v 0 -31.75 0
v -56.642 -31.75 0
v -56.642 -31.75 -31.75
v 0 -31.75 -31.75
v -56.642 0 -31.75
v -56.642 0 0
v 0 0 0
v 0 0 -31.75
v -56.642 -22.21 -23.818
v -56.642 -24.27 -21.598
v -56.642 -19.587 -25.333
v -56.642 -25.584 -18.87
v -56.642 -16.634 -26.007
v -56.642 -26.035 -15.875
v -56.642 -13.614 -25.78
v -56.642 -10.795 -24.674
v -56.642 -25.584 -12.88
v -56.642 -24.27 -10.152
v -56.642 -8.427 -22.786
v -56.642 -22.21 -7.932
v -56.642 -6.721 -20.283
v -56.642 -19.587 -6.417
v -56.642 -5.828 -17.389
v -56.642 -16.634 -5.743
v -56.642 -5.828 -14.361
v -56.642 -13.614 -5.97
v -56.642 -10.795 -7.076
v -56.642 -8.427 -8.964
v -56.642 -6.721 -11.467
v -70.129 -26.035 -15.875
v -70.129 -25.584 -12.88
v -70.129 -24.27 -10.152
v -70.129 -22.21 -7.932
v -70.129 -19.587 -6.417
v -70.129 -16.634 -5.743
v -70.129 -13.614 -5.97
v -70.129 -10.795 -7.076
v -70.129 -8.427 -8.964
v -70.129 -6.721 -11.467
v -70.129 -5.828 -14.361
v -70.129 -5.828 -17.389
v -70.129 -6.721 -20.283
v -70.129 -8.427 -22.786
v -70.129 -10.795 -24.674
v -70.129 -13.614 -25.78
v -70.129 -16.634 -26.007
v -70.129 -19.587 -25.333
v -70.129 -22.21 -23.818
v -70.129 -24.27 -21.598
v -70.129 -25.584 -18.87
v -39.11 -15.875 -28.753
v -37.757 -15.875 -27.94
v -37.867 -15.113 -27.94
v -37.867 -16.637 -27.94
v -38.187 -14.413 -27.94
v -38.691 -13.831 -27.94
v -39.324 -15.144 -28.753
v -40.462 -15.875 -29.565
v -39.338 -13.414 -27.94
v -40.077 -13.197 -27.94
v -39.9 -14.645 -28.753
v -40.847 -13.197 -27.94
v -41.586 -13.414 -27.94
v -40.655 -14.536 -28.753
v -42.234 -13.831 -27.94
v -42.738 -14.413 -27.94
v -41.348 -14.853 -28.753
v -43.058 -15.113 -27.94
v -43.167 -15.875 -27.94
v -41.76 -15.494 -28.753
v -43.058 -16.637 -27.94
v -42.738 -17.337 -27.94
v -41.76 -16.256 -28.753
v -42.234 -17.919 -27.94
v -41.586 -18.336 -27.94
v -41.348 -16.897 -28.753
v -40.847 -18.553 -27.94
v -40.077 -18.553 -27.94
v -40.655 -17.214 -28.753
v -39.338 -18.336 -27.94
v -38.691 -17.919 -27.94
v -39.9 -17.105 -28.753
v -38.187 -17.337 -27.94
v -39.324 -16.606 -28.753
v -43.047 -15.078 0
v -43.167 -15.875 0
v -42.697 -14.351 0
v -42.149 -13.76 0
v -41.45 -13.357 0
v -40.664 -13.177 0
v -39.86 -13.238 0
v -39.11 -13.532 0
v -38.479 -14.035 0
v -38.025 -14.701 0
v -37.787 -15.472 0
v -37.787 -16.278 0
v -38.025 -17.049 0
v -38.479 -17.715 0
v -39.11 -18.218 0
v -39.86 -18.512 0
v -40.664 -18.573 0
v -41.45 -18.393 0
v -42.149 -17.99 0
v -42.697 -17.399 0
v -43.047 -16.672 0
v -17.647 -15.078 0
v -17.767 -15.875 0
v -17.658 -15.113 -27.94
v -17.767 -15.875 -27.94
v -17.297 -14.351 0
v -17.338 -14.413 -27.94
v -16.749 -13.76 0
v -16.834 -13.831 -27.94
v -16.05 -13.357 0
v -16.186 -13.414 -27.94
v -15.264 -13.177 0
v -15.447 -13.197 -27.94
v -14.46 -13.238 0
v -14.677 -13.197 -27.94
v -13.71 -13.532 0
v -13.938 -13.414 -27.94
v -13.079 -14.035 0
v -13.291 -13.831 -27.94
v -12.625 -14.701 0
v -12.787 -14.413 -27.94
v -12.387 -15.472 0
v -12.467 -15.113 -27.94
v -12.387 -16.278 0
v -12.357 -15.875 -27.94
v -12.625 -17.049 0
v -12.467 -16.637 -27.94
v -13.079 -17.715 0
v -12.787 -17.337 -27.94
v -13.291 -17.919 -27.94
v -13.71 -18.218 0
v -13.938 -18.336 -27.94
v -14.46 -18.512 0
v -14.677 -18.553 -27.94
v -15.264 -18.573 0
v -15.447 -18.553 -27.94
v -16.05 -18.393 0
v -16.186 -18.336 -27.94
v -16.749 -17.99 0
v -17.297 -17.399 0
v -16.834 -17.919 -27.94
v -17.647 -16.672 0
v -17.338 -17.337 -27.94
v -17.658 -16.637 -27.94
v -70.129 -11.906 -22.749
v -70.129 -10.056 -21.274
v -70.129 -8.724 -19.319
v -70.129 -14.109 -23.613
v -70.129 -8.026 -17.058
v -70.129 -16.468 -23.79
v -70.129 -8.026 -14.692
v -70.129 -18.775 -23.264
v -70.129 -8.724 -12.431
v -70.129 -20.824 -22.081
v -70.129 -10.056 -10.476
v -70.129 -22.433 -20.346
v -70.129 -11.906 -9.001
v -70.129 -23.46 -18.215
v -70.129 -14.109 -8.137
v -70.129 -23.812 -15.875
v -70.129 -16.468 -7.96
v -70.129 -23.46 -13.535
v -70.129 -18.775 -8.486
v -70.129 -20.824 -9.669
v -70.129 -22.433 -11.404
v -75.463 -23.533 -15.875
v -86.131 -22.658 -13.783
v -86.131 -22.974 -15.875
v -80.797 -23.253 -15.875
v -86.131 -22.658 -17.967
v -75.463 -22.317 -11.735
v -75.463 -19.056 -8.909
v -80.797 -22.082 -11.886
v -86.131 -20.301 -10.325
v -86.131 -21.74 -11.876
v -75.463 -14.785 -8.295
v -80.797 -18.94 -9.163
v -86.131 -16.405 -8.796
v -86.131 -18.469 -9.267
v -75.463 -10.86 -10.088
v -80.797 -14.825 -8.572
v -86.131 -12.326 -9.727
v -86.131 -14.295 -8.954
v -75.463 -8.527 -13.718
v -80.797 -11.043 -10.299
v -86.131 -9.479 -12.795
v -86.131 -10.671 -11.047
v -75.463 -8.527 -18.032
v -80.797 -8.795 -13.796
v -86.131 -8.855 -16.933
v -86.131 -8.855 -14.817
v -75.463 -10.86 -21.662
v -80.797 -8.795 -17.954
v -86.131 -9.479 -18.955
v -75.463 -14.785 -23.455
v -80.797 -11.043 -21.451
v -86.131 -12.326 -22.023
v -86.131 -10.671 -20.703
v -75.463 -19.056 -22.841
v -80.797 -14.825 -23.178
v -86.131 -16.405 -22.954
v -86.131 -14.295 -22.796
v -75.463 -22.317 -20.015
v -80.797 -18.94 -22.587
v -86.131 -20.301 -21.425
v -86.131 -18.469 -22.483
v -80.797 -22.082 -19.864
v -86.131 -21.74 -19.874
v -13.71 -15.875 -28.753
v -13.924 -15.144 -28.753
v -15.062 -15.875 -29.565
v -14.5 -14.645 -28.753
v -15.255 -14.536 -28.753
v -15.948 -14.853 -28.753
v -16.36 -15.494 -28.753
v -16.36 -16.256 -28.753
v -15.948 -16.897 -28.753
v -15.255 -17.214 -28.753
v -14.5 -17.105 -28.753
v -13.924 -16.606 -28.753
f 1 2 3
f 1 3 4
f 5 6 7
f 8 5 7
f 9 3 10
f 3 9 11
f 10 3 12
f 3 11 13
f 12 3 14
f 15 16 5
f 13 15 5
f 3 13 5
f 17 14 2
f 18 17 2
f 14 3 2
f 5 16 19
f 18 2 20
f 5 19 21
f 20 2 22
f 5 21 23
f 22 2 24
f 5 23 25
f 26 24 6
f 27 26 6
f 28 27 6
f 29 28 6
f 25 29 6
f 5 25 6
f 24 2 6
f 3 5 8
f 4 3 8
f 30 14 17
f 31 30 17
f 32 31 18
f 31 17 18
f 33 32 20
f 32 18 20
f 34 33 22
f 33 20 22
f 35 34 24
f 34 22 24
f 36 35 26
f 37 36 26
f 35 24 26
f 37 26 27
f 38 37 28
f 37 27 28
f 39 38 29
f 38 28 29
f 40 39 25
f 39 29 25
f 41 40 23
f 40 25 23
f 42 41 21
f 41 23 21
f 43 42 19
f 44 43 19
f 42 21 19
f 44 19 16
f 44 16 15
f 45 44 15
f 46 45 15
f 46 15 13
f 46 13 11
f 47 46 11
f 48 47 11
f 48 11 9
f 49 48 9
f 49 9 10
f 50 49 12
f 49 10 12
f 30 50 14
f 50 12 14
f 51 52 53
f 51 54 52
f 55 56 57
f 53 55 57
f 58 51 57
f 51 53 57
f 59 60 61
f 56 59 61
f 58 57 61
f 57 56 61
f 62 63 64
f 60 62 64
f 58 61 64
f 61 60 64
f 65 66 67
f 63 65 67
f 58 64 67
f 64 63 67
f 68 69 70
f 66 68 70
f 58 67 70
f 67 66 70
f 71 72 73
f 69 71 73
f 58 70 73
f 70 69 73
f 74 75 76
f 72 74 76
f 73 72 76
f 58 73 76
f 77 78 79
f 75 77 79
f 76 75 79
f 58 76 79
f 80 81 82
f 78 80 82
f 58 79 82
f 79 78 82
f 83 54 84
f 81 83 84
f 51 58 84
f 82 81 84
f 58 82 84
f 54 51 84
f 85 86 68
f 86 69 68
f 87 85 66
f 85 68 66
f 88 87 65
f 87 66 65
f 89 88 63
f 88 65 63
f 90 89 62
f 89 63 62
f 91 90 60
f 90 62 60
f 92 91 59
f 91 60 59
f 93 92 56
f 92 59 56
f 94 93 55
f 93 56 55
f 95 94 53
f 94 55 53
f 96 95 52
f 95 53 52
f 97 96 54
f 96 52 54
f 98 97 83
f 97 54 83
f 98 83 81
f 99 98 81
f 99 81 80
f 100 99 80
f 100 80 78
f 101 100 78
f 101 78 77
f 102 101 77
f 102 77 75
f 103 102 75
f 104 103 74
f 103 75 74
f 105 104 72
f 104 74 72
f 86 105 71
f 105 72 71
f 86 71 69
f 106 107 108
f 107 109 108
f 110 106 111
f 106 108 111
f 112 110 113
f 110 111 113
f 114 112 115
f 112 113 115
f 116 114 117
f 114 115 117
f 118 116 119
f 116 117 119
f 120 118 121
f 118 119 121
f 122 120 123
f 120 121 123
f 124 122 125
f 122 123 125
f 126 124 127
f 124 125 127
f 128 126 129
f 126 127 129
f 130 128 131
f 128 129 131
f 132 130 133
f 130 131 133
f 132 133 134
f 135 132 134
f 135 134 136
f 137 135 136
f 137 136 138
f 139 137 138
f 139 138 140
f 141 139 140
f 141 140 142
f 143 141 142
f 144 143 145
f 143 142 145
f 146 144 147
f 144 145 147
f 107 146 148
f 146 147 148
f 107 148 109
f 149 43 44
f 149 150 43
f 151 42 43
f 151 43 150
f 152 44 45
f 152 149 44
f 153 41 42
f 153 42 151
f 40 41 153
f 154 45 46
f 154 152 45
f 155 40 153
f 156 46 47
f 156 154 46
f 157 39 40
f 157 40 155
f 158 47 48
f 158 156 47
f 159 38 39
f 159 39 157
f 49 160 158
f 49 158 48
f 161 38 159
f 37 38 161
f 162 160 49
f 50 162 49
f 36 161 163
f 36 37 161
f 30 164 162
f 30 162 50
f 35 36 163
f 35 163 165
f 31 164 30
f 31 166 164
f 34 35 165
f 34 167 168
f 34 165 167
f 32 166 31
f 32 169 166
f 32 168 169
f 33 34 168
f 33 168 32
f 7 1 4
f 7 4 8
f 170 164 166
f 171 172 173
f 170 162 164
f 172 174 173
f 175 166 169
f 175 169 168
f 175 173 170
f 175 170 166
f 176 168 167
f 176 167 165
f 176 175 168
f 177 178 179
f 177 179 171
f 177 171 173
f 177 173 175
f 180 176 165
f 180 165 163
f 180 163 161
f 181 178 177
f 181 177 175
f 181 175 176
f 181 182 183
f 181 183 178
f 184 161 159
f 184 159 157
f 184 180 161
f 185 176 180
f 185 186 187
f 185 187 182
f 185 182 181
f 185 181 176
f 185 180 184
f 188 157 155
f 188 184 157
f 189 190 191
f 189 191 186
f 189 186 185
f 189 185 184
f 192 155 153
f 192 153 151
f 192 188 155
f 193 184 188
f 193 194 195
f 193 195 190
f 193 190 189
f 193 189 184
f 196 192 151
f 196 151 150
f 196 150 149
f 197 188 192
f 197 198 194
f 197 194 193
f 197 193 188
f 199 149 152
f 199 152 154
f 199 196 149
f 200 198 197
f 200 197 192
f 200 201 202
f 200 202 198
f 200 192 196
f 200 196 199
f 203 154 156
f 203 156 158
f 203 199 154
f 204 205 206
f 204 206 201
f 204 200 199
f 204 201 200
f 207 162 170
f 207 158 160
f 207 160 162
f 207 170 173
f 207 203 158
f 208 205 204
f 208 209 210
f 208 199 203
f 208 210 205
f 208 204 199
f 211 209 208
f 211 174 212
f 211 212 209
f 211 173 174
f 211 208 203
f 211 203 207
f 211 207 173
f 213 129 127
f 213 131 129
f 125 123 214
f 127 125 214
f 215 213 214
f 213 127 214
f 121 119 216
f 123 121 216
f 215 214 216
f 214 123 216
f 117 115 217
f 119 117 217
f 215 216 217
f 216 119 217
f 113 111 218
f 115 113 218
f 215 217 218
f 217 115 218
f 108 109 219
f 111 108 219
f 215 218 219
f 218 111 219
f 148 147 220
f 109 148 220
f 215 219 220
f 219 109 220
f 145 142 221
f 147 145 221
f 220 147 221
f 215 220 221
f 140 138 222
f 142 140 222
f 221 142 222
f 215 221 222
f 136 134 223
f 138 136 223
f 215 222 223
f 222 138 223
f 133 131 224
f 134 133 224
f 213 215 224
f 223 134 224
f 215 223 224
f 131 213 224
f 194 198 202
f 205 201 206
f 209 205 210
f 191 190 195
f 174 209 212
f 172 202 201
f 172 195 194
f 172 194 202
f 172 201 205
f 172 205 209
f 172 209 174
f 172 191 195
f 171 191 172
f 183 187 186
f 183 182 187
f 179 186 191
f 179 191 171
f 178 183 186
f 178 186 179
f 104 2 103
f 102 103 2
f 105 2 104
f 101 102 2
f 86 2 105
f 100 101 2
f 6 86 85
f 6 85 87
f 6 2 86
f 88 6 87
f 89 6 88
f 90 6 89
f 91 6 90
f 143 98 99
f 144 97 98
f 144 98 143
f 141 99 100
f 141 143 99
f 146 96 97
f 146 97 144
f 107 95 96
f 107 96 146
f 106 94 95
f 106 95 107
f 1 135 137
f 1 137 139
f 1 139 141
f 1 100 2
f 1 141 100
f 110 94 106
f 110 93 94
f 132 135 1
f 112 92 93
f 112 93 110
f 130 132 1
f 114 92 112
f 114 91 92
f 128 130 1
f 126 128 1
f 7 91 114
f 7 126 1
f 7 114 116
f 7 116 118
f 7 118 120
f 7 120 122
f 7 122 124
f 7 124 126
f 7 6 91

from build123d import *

# Parameters (mm, degrees)
F0_W     = 56.642
F0_H     = 31.75
F1_DEPTH = 31.75
F2_R     = 10.16
F3_DEPTH = 13.4874
F4_R     = 7.9375
F5_DEPTH = 16.002
F5_TAPER = 3
F7_D     = 5.4102
F7_DEPTH = 27.94
F7_TIP   = 1.6253880605


with BuildPart() as f1:
    # F0 (on Top) → F1 (new body)
    with BuildSketch(Plane.XY):
        with Locations((-28.321, -15.875)):
            Rectangle(F0_W, F0_H)
    extrude(amount=-F1_DEPTH)

    # F2 (on face) → F3 (join)
    with BuildSketch(Plane(origin=(-56.642, 0, 0), x_dir=(0, -1, 0), z_dir=(-1, 0, 0))):
        with Locations((15.875, -15.875)):
            Circle(F2_R)
    extrude(amount=F3_DEPTH)

    # F4 (on face) → F5 (join)
    with BuildSketch(Plane(origin=(-70.1294, 0, 0), x_dir=(0, -1, 0), z_dir=(-1, 0, 0))):
        with Locations((15.875, -15.875)):
            Circle(F4_R)
    extrude(amount=F5_DEPTH, taper=F5_TAPER)

    # F7
    with Locations(Plane.XY):
        with Locations((-15.0622, -15.875), (-40.4622, -15.875)):
            Hole(F7_D / 2, depth=F7_DEPTH)
            with Locations((0, 0, -(F7_DEPTH + F7_TIP / 2))):  # 118° drill point
                Cone(0, F7_D / 2, F7_TIP, mode=Mode.SUBTRACT)


solid = f1.part
